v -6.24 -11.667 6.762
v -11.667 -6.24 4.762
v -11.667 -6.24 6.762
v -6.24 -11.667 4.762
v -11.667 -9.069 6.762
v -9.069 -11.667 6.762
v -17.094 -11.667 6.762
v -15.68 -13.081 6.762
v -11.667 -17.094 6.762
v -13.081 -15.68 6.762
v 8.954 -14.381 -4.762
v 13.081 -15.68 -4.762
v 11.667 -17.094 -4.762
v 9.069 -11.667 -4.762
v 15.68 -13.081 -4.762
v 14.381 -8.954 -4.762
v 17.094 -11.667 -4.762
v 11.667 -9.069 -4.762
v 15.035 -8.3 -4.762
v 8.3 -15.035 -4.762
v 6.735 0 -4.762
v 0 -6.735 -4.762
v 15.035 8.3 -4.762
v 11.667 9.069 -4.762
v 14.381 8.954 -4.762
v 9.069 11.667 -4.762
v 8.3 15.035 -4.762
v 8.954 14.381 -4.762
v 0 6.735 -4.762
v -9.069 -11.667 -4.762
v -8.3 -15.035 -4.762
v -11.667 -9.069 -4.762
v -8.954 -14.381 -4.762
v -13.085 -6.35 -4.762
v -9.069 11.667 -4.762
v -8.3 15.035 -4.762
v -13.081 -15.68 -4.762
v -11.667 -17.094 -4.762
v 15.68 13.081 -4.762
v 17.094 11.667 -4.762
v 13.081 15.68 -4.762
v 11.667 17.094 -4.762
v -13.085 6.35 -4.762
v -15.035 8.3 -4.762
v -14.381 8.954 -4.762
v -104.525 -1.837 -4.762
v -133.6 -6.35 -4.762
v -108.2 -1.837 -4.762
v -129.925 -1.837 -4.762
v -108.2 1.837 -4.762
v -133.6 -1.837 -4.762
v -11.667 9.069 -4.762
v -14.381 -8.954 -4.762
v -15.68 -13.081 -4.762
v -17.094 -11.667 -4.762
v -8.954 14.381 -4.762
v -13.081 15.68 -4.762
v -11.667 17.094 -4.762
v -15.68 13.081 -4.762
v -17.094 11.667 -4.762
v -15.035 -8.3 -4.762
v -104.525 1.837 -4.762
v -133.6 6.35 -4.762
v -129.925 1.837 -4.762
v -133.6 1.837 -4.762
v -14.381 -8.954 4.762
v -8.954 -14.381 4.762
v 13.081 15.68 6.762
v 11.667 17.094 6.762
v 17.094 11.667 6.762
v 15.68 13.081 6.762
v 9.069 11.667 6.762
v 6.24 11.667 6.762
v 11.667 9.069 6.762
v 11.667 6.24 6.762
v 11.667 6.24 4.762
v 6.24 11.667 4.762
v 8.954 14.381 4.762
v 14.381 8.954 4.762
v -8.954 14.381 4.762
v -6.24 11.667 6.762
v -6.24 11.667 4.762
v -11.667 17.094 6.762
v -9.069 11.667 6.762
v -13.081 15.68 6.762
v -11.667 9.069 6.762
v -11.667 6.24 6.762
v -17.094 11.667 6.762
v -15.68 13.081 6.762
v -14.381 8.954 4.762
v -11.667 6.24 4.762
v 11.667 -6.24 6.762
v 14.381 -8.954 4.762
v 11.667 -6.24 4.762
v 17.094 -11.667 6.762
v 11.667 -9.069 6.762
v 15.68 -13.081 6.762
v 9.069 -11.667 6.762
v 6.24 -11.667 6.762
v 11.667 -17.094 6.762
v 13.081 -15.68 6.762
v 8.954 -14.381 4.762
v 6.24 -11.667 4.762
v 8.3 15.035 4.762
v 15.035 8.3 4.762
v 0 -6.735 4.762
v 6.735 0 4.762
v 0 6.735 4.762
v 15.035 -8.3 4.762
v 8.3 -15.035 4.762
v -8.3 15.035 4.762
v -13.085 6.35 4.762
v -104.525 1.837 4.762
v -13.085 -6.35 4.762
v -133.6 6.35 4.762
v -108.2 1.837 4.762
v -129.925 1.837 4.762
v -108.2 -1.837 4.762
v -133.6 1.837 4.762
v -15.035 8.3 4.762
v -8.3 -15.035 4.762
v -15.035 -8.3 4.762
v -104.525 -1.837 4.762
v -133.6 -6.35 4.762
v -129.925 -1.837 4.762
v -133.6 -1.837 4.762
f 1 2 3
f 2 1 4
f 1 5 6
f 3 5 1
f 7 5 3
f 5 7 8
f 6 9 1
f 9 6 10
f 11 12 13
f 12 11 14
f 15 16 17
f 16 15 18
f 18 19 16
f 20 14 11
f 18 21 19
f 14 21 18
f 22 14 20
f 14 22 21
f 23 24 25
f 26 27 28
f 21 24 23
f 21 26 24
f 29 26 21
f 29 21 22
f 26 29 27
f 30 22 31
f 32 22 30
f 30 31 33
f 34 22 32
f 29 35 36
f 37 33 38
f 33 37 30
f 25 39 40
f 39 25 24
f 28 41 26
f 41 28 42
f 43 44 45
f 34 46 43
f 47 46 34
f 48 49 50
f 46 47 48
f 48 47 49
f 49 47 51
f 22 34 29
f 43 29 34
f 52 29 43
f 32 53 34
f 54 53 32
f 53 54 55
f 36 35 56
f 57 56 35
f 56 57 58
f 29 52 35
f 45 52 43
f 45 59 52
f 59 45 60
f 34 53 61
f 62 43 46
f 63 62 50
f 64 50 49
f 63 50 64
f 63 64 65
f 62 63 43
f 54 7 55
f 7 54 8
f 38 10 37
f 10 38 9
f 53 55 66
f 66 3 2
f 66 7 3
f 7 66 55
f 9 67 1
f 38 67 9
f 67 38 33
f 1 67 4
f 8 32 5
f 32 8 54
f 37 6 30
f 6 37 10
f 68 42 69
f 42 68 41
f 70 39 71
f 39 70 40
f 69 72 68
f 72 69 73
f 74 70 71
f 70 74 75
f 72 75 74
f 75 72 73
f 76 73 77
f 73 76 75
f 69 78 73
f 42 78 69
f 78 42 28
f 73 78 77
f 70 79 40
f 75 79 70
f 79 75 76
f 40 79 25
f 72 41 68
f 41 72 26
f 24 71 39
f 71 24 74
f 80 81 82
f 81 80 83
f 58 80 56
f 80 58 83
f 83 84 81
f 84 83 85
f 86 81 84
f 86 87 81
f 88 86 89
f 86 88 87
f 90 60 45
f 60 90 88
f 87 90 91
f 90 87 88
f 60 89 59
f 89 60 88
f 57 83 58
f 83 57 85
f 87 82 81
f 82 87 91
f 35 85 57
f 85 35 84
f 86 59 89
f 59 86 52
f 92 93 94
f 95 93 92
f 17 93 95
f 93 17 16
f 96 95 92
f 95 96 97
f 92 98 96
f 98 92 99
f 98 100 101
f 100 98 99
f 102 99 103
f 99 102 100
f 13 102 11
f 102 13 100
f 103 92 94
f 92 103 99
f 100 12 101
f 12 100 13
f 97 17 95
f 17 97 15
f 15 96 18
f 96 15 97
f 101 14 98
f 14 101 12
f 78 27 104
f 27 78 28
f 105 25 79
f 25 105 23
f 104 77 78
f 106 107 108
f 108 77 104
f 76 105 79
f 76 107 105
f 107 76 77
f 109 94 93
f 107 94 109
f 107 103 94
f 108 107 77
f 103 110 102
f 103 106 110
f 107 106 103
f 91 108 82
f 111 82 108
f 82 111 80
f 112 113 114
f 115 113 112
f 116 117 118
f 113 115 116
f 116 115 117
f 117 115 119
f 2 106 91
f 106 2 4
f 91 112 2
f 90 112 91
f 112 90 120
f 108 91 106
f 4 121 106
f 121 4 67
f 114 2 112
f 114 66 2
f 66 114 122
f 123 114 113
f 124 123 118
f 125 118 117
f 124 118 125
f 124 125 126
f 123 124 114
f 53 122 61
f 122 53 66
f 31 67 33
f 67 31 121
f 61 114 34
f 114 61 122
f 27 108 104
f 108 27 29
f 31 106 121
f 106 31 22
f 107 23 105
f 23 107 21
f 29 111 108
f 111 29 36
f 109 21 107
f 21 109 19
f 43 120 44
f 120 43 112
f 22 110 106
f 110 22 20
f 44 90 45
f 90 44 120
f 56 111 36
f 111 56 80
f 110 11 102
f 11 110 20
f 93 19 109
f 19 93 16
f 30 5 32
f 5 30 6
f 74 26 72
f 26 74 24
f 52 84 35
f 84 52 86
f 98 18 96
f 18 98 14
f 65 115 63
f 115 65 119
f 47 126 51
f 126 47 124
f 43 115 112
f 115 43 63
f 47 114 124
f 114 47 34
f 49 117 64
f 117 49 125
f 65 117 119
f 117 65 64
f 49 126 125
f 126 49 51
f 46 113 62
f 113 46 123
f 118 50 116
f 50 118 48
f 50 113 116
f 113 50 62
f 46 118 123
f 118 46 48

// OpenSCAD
// file: common.scad
// this contains functions and parameters common to both arm and hub files.

// converts x in inches to x in mm.
function i2mm(x) = x * 0.0254 * 1000;

// distance from hub center to first arm mount point. must be less than second arm mount point.
function first_mount_radius() = i2mm(1);

// distance from hub center to second arm mount point. must be greater than first arm mount point.
function second_mount_radius() = i2mm(2);

// diameter of hole for fasteners between arm and hub.
function hole_diam() = i2mm(1/8) + 0.5;

function arm_width() = i2mm(0.5);
// main file
// Units are mm.

use <common.scad>;

// the motor is assumed to have a square bolt pattern arrangement.
// avoids geometric holes for more reliable print quality.

// distance between 2 mount holes, using the line that goes through the center of the motor.
mount_dim = 33;

// distance from hub center to motor center.
// assumes all motors are equidistant from center.
arm_length = i2mm(6 + 3/16);

arm_thickness = i2mm(0.375);

motor_mount_thickness = arm_thickness;

// shell thickness of spacer that separates the motor from the top surface arm.
spacer_thickness = 2;

// height of spacer that separates the motor from the top surface arm.
spacer_height = 2;

motor_mount_arm_width = i2mm(3/8);

module spacer() {
    difference() {
        h = motor_mount_thickness + spacer_height;
        od = hole_diam() + 2 * spacer_thickness;
        cube([od, od, h], center = true);
        id = hole_diam();
        cube([id, id, 2 * h], center = true);
    }
}

module motor_cross() {
    difference() {
        union() {
            extension = 0 * hole_diam() / 2;
            cube(size = [mount_dim + 2 * extension, motor_mount_arm_width, motor_mount_thickness], center = true);
            cube(size = [motor_mount_arm_width, mount_dim + 2 * extension, motor_mount_thickness], center = true);
            translate([0, 0, spacer_thickness / 2]) {
                translate([-mount_dim / 2, 0, 0])
                    spacer();
                translate([mount_dim / 2, 0, 0])
                    spacer();
                translate([0, mount_dim / 2, 0])
                    spacer();
                translate([0, -mount_dim / 2, 0])
                    spacer();
            }
        }

        cut_dim = 2 * hole_diam();
        cut_shift = hole_diam() / 2;
        translate([-mount_dim / 2 - cut_shift, 0, 0])
            cube(size = [cut_dim, hole_diam(), 2 * motor_mount_thickness], center = true);
        translate([mount_dim / 2 + cut_shift, 0, 0])
            cube(size = [cut_dim, hole_diam(), 2 * motor_mount_thickness], center = true);
        translate([0, mount_dim / 2 + cut_shift, 0])
            cube(size = [hole_diam(), cut_dim, 2 * motor_mount_thickness], center = true);
        translate([0, -mount_dim / 2 - cut_shift, 0])
            cube(size = [hole_diam(), cut_dim, 2 * motor_mount_thickness], center = true);
    }
}

rotate([0, 0, 45])
    motor_cross();
difference() {
    arm_length_ = arm_length - first_mount_radius() + hole_diam() / 2;
    translate([-arm_length_ / 2, 0, 0])
        cube(size = [arm_length_, arm_width(), arm_thickness], center = true);
    cut_dim = 2 * hole_diam();
    cut_shift = hole_diam() / 2;
    translate([-arm_length + first_mount_radius() - cut_shift, 0, 0])
        cube(size = [cut_dim, hole_diam(), 2 * arm_thickness], center = true);
    translate([-arm_length + second_mount_radius(), 0, 0])
        cube(size = [hole_diam(), hole_diam(), 2 * arm_thickness], center = true);
}
